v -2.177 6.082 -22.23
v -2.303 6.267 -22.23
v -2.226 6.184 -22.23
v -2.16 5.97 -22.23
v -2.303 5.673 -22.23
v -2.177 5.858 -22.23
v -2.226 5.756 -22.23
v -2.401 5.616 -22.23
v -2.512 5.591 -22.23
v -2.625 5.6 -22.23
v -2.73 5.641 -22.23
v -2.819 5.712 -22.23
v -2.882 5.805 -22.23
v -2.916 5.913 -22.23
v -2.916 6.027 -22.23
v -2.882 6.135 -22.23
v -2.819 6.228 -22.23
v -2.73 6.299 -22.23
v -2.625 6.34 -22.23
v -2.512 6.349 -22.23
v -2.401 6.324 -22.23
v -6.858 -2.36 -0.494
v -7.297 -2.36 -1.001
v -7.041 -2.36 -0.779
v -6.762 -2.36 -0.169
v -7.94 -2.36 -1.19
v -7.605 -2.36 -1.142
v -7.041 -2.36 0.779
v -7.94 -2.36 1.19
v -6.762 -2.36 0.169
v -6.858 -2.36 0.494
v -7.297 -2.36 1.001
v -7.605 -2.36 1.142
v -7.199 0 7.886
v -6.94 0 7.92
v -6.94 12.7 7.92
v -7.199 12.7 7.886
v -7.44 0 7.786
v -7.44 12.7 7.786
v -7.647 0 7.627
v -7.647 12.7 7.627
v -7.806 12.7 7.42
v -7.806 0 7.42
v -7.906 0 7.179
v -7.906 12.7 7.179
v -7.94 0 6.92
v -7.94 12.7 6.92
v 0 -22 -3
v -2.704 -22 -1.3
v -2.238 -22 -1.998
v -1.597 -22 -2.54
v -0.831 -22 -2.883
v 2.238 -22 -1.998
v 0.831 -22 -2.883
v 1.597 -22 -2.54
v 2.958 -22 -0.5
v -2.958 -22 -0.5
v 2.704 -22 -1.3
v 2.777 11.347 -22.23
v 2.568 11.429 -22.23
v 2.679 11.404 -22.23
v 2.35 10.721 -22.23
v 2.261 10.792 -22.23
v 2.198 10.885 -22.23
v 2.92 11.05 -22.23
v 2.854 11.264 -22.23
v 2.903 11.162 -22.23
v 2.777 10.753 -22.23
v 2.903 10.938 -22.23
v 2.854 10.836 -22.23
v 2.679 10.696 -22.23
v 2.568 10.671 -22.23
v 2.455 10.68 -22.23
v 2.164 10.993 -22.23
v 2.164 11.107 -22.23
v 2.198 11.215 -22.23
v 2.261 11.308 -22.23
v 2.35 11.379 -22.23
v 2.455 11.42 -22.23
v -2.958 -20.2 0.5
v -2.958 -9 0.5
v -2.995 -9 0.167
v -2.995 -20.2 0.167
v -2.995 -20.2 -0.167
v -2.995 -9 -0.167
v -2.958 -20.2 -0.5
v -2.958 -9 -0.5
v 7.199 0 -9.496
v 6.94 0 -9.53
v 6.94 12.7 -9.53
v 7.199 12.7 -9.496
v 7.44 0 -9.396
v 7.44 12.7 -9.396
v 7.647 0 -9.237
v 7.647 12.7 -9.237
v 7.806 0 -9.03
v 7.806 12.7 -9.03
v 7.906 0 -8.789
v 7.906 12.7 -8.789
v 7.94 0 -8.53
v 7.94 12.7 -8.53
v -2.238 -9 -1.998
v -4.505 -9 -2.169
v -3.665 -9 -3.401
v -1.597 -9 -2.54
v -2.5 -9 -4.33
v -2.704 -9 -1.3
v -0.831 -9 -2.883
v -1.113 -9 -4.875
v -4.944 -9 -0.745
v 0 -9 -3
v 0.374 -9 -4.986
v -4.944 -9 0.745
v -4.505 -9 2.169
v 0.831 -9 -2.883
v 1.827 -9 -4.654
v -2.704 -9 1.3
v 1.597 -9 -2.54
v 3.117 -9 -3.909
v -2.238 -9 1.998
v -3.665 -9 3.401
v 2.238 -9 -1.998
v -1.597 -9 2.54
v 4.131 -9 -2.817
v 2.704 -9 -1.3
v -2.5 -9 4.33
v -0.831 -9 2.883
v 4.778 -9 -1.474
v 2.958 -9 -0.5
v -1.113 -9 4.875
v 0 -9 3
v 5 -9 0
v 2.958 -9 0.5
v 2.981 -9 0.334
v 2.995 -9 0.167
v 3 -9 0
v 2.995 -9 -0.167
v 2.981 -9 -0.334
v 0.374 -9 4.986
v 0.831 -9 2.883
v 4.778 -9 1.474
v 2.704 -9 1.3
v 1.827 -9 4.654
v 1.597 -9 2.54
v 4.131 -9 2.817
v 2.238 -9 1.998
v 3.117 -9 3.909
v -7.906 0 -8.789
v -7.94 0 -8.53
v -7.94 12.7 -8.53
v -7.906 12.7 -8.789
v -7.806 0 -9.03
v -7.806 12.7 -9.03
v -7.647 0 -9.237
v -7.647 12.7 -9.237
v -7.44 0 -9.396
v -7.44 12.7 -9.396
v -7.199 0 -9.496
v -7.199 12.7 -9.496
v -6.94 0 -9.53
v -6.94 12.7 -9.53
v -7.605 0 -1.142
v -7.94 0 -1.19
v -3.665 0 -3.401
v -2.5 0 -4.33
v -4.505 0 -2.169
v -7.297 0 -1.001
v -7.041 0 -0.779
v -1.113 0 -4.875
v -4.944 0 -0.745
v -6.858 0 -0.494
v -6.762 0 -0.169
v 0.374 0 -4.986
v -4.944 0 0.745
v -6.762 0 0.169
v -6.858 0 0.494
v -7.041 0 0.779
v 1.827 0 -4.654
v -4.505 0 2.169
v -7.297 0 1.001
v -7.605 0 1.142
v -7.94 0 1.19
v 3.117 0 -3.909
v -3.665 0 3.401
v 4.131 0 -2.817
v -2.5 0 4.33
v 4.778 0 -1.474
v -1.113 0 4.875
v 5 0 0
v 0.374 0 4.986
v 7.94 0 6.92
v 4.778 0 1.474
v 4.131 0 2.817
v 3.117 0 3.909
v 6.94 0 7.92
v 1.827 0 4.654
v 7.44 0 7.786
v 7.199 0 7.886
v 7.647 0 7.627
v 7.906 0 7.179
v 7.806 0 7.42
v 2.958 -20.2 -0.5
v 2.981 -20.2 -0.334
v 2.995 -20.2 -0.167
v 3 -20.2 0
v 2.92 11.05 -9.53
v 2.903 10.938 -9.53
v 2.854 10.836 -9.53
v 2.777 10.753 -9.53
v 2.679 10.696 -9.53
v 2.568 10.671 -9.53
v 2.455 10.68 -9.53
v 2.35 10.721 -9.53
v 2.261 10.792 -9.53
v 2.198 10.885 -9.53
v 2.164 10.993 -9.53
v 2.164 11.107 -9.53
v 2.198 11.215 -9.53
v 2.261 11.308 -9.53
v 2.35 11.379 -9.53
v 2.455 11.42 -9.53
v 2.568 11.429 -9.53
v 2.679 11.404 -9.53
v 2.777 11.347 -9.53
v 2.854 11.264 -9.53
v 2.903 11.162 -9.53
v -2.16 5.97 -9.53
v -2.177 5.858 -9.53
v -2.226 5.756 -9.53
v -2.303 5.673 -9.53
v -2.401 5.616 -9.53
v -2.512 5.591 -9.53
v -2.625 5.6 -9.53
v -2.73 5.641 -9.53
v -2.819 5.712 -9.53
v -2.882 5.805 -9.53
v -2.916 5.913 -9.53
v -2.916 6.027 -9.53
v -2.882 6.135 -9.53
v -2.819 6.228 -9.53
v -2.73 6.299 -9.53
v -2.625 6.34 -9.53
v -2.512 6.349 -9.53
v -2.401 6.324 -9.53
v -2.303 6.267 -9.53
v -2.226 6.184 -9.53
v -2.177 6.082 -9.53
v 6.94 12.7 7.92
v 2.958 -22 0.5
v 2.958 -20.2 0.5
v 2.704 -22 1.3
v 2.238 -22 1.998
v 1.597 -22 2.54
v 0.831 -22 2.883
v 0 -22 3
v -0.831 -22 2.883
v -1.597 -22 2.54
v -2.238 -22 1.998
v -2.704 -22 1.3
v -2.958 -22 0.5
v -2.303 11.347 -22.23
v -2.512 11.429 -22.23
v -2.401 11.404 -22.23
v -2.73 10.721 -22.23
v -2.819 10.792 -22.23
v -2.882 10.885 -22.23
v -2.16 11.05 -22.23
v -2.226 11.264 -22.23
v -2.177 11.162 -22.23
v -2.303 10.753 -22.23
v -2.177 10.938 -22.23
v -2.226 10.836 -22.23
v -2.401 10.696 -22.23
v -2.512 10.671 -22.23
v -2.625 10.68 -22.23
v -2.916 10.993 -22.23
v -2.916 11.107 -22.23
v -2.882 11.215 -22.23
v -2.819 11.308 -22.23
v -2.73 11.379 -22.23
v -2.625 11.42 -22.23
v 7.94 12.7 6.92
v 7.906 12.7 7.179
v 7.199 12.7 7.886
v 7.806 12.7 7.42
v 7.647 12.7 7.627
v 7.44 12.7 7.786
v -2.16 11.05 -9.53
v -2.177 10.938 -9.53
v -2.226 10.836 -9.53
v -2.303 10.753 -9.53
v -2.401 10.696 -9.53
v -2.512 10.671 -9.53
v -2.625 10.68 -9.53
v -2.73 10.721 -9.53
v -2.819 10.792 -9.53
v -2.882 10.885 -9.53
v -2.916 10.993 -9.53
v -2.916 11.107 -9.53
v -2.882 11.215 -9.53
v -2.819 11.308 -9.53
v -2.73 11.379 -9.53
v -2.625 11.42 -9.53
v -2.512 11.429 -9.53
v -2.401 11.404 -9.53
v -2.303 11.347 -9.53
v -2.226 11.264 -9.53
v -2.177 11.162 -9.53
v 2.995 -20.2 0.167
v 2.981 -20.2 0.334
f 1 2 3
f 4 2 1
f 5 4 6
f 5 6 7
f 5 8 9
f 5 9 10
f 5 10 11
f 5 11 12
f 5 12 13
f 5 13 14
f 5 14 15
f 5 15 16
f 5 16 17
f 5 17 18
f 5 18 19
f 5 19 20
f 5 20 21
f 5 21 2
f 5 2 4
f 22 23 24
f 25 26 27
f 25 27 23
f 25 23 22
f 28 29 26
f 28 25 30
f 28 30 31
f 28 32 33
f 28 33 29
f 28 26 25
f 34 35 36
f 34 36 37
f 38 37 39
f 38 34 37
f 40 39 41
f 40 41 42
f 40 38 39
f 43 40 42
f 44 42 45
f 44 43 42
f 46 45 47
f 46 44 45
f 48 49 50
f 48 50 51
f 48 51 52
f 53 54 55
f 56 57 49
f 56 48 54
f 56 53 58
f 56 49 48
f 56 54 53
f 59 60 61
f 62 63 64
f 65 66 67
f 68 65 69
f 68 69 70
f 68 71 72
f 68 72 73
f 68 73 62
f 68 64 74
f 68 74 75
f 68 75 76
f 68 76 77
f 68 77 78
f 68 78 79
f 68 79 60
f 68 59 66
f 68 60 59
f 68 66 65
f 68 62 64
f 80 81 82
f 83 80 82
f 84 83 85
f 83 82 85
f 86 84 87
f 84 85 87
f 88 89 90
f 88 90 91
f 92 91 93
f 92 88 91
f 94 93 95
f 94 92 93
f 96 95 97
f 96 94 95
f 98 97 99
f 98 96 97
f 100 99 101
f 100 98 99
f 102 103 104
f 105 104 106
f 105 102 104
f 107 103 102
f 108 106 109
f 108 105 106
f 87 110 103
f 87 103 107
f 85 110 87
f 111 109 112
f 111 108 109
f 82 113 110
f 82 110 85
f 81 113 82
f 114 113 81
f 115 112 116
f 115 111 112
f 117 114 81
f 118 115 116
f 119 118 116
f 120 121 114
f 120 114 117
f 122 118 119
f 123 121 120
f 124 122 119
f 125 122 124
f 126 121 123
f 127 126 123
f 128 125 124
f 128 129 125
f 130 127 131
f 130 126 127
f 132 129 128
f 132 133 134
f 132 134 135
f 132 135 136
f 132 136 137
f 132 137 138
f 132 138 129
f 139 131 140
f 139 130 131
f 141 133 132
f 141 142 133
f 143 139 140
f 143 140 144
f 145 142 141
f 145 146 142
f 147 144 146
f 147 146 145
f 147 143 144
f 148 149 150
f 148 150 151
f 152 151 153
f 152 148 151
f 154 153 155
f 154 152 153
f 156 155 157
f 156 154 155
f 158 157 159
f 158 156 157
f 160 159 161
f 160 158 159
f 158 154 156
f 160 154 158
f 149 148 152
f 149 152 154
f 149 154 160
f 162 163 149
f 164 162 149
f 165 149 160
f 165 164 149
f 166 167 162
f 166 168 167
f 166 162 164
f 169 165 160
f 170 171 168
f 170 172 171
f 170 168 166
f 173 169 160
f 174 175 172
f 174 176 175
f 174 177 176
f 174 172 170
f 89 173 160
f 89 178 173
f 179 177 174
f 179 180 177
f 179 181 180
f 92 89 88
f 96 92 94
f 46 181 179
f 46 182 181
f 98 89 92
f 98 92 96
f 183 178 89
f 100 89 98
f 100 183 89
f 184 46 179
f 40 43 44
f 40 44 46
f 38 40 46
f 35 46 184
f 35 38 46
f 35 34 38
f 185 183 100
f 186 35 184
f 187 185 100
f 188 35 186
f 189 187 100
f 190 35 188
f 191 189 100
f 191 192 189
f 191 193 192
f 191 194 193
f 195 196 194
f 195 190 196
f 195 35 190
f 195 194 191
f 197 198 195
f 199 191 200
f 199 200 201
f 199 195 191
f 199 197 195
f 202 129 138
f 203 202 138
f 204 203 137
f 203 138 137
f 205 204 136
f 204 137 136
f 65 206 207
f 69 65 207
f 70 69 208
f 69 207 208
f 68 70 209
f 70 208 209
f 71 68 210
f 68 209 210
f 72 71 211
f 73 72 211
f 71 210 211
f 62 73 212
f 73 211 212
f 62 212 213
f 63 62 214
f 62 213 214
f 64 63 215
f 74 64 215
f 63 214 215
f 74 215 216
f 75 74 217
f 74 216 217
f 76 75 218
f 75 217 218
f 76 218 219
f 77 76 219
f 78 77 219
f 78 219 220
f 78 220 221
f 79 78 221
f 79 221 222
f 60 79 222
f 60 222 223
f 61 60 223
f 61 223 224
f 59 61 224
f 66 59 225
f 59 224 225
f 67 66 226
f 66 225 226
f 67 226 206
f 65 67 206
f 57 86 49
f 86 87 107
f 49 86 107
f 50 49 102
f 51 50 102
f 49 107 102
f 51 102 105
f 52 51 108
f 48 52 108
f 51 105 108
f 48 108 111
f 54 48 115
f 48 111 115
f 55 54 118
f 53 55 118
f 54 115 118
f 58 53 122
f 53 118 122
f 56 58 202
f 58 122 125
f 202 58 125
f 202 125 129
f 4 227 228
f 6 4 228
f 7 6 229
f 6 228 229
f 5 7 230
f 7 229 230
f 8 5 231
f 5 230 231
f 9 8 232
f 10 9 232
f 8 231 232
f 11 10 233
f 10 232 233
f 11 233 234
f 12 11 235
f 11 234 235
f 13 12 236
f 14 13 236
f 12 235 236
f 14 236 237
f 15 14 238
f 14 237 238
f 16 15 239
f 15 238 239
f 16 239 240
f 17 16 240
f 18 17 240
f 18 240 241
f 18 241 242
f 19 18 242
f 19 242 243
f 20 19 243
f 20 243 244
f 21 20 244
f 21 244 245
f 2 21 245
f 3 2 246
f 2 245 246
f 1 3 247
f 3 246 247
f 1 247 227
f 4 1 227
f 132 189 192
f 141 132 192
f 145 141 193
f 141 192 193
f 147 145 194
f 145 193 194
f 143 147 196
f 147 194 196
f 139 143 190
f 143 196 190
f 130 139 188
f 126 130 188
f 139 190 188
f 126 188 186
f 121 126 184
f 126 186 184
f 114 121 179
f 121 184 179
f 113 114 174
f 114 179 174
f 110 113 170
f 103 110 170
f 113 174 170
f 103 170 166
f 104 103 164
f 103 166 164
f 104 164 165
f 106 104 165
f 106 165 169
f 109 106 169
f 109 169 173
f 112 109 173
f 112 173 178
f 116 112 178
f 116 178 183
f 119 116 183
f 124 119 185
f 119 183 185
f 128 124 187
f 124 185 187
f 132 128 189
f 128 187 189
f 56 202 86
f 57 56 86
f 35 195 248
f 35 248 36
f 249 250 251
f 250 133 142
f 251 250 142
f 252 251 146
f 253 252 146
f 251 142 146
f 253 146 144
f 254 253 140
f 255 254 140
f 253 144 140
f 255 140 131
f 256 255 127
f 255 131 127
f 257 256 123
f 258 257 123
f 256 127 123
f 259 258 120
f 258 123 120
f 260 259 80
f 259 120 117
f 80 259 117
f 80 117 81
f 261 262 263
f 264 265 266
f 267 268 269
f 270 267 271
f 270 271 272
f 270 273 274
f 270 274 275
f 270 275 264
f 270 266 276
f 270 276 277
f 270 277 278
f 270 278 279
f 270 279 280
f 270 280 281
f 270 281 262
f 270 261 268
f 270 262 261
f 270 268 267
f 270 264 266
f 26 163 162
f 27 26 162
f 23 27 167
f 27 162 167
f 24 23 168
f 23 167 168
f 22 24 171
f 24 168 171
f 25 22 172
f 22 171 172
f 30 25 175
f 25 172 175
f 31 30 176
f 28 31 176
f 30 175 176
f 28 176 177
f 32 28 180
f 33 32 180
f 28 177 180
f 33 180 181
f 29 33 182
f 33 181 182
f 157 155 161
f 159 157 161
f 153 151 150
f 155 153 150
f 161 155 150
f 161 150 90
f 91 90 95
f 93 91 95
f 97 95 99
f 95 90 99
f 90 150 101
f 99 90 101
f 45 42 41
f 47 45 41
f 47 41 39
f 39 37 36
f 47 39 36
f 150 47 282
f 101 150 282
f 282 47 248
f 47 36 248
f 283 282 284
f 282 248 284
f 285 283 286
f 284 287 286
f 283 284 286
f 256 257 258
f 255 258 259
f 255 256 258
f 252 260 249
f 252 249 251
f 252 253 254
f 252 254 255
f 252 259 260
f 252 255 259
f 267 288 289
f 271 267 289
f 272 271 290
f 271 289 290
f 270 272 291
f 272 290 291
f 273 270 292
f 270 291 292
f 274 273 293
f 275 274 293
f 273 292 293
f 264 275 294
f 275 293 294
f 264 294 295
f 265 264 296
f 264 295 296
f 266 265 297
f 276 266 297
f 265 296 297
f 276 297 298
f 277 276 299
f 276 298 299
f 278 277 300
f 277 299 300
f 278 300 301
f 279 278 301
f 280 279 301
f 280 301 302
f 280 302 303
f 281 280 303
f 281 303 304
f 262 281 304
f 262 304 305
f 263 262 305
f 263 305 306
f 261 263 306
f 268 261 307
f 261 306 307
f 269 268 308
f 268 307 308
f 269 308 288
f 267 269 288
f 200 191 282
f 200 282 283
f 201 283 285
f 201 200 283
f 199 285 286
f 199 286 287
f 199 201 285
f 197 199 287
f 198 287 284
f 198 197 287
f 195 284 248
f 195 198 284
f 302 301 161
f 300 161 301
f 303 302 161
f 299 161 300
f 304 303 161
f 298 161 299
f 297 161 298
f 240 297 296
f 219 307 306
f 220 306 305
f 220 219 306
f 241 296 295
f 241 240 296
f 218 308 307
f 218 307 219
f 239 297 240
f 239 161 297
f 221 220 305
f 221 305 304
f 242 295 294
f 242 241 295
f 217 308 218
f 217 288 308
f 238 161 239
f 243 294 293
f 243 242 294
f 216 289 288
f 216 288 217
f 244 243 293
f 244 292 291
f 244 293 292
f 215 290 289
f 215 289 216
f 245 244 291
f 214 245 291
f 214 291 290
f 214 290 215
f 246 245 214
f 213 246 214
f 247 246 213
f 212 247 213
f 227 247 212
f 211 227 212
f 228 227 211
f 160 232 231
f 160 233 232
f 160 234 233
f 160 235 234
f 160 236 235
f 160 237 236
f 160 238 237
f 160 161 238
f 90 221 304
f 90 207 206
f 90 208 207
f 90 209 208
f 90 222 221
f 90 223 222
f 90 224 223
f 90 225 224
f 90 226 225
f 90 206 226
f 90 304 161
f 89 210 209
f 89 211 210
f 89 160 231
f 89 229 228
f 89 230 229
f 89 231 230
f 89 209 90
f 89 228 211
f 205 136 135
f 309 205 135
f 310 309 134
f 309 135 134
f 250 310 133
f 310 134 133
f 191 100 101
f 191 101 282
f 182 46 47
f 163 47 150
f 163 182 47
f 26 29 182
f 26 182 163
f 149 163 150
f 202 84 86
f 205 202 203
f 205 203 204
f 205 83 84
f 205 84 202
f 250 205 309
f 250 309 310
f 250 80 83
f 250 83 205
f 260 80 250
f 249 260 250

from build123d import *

# Parameters (mm, degrees)
F0_R     = 5
F1_DEPTH = 12.7
F2_DEPTH = 22
F3_DEPTH = 20.2
F4_DEPTH = 9
F5_DEPTH = 2.36
F6_R     = 0.38
F7_DEPTH = 12.7


with BuildPart() as f1:
    # F0 (on Front) → F1 (new body)
    with BuildSketch(Plane.XZ):
        with BuildLine():
            Line((-6.94, -9.53), (6.94, -9.53))
            ThreePointArc((6.94, -9.53), (7.647107, -9.237107), (7.94, -8.53))
            Line((7.94, -8.53), (7.94, 6.92))
            ThreePointArc((7.94, 6.92), (7.647107, 7.627107), (6.94, 7.92))
            Line((6.94, 7.92), (-6.94, 7.92))
            ThreePointArc((-6.94, 7.92), (-7.647107, 7.627107), (-7.94, 6.92))
            Line((-7.94, 6.92), (-7.94, 1.19))
            ThreePointArc((-7.94, 1.19), (-6.75, 0), (-7.94, -1.19))
            Line((-7.94, -1.19), (-7.94, -8.53))
            ThreePointArc((-7.94, -8.53), (-7.647107, -9.237107), (-6.94, -9.53))
        make_face()
        Circle(F0_R, mode=Mode.SUBTRACT)
        Circle(F0_R)
        with BuildLine():
            ThreePointArc((2.95804, 0.5), (2.989492, 0.250879), (3, 0))
            ThreePointArc((3, 0), (2.989492, -0.250879), (2.95804, -0.5))
            ThreePointArc((2.95804, -0.5), (0, -3), (-2.95804, -0.5))
            ThreePointArc((-2.95804, -0.5), (-3, 0), (-2.95804, 0.5))
            ThreePointArc((-2.95804, 0.5), (0, 3), (2.95804, 0.5))
        make_face(mode=Mode.SUBTRACT)
        with BuildLine():
            Line((-7.94, 1.19), (-7.94, -1.19))
            ThreePointArc((-7.94, -1.19), (-6.75, 0), (-7.94, 1.19))
        make_face()
        with BuildLine():
            ThreePointArc((2.95804, -0.5), (2.989492, -0.250879), (3, 0))
            ThreePointArc((3, 0), (2.989492, 0.250879), (2.95804, 0.5))
            Line((2.95804, 0.5), (-2.95804, 0.5))
            ThreePointArc((-2.95804, 0.5), (-3, 0), (-2.95804, -0.5))
            Line((-2.95804, -0.5), (2.95804, -0.5))
        make_face()
        with BuildLine():
            Line((-2.95804, 0.5), (2.95804, 0.5))
            ThreePointArc((2.95804, 0.5), (0, 3), (-2.95804, 0.5))
        make_face()
        with BuildLine():
            ThreePointArc((-2.95804, -0.5), (0, -3), (2.95804, -0.5))
            Line((2.95804, -0.5), (-2.95804, -0.5))
        make_face()
    extrude(amount=-F1_DEPTH)

    # F0 (on Front) → F2 (join)
    with BuildSketch(Plane.XZ):
        with BuildLine():
            Line((-2.95804, 0.5), (2.95804, 0.5))
            ThreePointArc((2.95804, 0.5), (0, 3), (-2.95804, 0.5))
        make_face()
        with BuildLine():
            ThreePointArc((-2.95804, -0.5), (0, -3), (2.95804, -0.5))
            Line((2.95804, -0.5), (-2.95804, -0.5))
        make_face()
    extrude(amount=F2_DEPTH)

    # F0 (on Front) → F3 (join)
    with BuildSketch(Plane.XZ):
        with BuildLine():
            ThreePointArc((2.95804, -0.5), (2.989492, -0.250879), (3, 0))
            ThreePointArc((3, 0), (2.989492, 0.250879), (2.95804, 0.5))
            Line((2.95804, 0.5), (-2.95804, 0.5))
            ThreePointArc((-2.95804, 0.5), (-3, 0), (-2.95804, -0.5))
            Line((-2.95804, -0.5), (2.95804, -0.5))
        make_face()
    extrude(amount=F3_DEPTH)

    # F0 (on Front) → F4 (join)
    with BuildSketch(Plane.XZ):
        Circle(F0_R)
        with BuildLine():
            ThreePointArc((2.95804, 0.5), (2.989492, 0.250879), (3, 0))
            ThreePointArc((3, 0), (2.989492, -0.250879), (2.95804, -0.5))
            ThreePointArc((2.95804, -0.5), (0, -3), (-2.95804, -0.5))
            ThreePointArc((-2.95804, -0.5), (-3, 0), (-2.95804, 0.5))
            ThreePointArc((-2.95804, 0.5), (0, 3), (2.95804, 0.5))
        make_face(mode=Mode.SUBTRACT)
    extrude(amount=F4_DEPTH)

    # F0 (on Front) → F5 (join)
    with BuildSketch(Plane.XZ):
        with BuildLine():
            Line((-7.94, 1.19), (-7.94, -1.19))
            ThreePointArc((-7.94, -1.19), (-6.75, 0), (-7.94, 1.19))
        make_face()
    extrude(amount=F5_DEPTH)

    # F6 (on face) → F7 (join)
    with BuildSketch(Plane(origin=(0, 0, -9.53), x_dir=(1, 0, 0), z_dir=(0, 0, -1))):
        with Locations((-2.54, -5.97)):
            Circle(F6_R)
        with Locations((-2.54, -11.05)):
            Circle(F6_R)
        with Locations((2.54, -11.05)):
            Circle(F6_R)
    extrude(amount=F7_DEPTH)


solid = f1.part
